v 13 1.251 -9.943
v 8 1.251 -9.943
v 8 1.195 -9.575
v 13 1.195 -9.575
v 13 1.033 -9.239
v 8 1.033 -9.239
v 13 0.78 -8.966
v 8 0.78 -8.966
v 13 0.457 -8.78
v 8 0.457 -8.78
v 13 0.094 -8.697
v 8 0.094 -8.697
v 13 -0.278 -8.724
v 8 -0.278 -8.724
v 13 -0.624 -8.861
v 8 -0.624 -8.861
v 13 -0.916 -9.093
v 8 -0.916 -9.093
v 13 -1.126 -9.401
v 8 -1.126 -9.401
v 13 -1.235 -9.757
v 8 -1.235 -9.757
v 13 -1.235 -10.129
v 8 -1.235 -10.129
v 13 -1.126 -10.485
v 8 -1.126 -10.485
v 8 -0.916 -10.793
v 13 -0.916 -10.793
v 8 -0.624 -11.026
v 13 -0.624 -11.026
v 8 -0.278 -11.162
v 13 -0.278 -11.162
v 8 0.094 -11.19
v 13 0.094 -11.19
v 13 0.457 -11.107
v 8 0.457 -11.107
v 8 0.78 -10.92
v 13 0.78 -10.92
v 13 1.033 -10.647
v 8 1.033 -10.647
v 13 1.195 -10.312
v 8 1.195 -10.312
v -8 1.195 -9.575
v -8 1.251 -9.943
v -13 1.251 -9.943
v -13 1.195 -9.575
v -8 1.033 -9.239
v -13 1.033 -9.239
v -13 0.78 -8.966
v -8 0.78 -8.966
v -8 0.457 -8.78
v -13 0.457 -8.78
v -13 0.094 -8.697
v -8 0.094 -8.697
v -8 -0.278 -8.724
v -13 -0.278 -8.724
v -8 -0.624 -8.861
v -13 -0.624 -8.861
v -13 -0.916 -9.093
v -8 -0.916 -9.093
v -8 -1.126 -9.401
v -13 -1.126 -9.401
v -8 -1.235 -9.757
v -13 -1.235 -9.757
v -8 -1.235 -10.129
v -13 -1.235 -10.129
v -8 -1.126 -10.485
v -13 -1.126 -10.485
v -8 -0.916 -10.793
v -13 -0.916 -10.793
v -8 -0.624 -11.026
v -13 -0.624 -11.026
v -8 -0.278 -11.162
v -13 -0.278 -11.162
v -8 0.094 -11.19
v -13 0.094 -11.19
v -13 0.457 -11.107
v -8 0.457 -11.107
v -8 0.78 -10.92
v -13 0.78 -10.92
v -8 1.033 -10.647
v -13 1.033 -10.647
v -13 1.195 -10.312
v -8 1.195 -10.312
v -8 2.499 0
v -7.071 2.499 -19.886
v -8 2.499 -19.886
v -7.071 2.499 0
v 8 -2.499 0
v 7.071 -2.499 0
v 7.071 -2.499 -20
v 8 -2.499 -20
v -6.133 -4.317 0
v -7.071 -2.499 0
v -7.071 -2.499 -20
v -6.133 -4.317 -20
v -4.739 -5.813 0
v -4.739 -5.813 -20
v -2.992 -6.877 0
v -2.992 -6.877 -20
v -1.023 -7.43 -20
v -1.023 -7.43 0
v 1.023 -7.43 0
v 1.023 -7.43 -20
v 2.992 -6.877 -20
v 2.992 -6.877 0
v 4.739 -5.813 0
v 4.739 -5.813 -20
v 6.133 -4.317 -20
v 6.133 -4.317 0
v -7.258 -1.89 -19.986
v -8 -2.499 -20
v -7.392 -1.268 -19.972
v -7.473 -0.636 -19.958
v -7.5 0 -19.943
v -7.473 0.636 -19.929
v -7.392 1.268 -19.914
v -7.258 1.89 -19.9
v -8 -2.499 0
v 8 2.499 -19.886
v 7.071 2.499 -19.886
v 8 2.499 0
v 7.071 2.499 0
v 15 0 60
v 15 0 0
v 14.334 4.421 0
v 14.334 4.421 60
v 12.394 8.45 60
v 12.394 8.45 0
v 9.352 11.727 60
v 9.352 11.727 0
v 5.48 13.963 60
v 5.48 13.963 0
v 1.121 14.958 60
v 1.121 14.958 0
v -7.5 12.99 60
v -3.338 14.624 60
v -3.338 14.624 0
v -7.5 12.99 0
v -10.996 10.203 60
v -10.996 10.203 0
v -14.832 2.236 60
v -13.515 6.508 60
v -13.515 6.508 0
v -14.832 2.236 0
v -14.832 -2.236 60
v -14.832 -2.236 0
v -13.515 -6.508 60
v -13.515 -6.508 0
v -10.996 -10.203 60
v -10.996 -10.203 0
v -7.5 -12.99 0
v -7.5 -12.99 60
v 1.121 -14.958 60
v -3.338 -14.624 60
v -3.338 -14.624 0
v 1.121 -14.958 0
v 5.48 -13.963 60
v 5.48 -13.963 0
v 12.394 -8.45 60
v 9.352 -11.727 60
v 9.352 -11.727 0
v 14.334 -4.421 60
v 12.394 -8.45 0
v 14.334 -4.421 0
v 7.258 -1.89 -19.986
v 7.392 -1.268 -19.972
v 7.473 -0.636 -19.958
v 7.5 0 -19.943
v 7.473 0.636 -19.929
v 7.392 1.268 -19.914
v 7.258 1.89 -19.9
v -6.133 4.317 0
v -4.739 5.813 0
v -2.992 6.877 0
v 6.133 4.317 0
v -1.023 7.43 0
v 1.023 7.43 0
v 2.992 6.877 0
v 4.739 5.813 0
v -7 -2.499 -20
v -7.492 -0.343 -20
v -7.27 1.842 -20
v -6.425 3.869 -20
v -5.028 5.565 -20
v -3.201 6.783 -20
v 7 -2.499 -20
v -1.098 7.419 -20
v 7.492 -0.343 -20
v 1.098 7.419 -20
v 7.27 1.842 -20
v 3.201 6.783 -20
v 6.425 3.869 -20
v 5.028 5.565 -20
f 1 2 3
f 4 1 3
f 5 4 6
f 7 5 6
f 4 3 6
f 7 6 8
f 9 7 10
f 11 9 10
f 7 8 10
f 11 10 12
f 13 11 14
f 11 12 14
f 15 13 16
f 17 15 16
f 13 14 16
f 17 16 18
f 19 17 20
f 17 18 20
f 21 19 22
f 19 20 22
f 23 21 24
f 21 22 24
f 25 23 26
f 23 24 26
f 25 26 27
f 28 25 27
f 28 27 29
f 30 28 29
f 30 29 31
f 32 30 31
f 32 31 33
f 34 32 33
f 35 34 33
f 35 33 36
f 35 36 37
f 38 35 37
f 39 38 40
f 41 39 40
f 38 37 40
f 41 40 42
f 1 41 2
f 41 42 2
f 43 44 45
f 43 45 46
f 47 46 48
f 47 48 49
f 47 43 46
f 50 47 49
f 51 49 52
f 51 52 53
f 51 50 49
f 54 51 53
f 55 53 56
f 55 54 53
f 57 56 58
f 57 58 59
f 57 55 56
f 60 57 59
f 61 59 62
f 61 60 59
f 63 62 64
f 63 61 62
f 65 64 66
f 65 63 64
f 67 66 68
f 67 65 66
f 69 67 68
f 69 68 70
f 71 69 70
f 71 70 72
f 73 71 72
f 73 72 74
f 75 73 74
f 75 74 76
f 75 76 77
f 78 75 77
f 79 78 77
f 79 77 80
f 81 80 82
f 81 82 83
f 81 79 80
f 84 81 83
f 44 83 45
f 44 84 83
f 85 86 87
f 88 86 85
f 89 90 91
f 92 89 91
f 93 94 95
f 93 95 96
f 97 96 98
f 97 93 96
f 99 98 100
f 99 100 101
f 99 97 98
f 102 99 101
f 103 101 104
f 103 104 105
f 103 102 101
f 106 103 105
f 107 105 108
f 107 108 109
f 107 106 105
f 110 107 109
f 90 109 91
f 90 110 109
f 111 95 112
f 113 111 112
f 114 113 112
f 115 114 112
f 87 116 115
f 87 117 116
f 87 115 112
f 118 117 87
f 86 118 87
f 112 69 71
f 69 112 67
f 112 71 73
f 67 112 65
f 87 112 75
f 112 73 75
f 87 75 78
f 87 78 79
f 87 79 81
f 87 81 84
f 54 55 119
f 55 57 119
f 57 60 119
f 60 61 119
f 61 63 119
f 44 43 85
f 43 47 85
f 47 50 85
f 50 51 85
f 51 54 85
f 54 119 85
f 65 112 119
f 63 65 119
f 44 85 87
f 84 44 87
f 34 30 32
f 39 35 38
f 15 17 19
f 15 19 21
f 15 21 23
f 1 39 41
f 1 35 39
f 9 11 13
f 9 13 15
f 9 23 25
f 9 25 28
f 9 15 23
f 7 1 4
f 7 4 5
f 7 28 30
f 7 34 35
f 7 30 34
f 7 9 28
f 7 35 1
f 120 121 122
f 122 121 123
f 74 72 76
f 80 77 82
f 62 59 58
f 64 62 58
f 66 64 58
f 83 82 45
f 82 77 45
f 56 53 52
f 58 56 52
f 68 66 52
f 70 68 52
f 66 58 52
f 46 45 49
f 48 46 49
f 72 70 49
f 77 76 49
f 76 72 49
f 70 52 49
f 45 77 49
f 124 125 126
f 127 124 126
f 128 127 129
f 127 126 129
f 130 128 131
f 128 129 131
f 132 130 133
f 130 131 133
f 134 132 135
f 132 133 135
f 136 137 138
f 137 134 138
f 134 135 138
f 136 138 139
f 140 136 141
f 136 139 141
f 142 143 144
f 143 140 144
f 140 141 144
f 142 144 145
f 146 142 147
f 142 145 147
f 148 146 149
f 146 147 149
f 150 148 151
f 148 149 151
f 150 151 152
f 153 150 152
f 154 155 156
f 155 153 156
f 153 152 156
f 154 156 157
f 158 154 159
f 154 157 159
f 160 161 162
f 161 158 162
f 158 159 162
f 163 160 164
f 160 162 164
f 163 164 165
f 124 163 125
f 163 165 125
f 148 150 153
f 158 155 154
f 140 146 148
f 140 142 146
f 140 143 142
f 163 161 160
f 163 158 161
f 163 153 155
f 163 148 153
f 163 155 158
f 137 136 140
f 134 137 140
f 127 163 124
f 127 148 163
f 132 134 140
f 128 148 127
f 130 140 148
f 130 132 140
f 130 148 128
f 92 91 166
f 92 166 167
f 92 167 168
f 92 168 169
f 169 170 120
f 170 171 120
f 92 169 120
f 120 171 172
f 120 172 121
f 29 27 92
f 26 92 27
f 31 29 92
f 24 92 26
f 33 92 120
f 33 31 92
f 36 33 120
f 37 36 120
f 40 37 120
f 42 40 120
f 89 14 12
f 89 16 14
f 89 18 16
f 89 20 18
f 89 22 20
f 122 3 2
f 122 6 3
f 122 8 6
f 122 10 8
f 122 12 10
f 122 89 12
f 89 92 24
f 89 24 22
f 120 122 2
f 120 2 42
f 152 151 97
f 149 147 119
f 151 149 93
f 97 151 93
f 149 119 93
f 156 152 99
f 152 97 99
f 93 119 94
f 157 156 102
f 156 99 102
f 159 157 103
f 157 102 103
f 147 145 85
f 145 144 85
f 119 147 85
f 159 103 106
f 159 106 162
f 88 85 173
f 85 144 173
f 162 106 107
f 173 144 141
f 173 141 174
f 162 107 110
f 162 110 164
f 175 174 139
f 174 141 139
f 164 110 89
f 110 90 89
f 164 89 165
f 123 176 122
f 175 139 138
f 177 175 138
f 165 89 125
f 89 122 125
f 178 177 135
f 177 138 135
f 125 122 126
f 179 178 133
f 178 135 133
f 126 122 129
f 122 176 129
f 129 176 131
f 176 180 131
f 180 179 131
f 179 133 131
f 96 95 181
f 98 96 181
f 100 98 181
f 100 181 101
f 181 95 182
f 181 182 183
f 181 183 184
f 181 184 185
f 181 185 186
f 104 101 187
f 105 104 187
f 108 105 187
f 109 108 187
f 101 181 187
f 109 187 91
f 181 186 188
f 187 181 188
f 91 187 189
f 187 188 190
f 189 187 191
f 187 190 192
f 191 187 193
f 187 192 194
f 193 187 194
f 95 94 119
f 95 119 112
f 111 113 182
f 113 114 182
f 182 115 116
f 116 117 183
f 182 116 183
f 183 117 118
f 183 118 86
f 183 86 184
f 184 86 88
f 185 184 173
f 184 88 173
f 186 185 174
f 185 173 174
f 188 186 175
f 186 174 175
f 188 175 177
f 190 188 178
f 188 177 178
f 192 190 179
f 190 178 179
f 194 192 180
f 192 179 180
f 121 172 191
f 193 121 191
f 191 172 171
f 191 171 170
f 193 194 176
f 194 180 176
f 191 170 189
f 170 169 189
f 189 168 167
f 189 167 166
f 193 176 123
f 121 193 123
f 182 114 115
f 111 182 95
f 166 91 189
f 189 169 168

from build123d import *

# Parameters (mm, degrees)
F0_R     = 15
F1_DEPTH = 60
F2_R     = 7.5
F3_DEPTH = 20
F6_DEPTH = 1
F7_R     = 1.25
F8_DEPTH = 5


with BuildPart() as f1:
    # F0 (on Top) → F1 (new body)
    with BuildSketch(Plane.XY):
        Circle(F0_R)
    extrude(amount=F1_DEPTH)

    # F2 (on Top) → F3 (join)
    with BuildSketch(Plane.XY):
        Circle(F2_R)
    extrude(amount=-F3_DEPTH)

    # F5 (on offset) → F6 (join)
    with BuildSketch(Plane.YZ.offset(7)):
        Polygon((-2.499352, 0), (-2.499352, -20), (2.499352, -19.886207), (2.499352, 0), align=None)
    extrude(amount=F6_DEPTH)

    # F7 (on face) → F8 (join)
    with BuildSketch(Plane.YZ.offset(8)):
        with Locations((0.000648, -9.943104)):
            Circle(F7_R)
    extrude(amount=F8_DEPTH)

    # F9: F1 across plane


with BuildPart() as f1_1:
    add(f1.part)
    add(f1.part.mirror(Plane.YZ))


solid = f1_1.part
